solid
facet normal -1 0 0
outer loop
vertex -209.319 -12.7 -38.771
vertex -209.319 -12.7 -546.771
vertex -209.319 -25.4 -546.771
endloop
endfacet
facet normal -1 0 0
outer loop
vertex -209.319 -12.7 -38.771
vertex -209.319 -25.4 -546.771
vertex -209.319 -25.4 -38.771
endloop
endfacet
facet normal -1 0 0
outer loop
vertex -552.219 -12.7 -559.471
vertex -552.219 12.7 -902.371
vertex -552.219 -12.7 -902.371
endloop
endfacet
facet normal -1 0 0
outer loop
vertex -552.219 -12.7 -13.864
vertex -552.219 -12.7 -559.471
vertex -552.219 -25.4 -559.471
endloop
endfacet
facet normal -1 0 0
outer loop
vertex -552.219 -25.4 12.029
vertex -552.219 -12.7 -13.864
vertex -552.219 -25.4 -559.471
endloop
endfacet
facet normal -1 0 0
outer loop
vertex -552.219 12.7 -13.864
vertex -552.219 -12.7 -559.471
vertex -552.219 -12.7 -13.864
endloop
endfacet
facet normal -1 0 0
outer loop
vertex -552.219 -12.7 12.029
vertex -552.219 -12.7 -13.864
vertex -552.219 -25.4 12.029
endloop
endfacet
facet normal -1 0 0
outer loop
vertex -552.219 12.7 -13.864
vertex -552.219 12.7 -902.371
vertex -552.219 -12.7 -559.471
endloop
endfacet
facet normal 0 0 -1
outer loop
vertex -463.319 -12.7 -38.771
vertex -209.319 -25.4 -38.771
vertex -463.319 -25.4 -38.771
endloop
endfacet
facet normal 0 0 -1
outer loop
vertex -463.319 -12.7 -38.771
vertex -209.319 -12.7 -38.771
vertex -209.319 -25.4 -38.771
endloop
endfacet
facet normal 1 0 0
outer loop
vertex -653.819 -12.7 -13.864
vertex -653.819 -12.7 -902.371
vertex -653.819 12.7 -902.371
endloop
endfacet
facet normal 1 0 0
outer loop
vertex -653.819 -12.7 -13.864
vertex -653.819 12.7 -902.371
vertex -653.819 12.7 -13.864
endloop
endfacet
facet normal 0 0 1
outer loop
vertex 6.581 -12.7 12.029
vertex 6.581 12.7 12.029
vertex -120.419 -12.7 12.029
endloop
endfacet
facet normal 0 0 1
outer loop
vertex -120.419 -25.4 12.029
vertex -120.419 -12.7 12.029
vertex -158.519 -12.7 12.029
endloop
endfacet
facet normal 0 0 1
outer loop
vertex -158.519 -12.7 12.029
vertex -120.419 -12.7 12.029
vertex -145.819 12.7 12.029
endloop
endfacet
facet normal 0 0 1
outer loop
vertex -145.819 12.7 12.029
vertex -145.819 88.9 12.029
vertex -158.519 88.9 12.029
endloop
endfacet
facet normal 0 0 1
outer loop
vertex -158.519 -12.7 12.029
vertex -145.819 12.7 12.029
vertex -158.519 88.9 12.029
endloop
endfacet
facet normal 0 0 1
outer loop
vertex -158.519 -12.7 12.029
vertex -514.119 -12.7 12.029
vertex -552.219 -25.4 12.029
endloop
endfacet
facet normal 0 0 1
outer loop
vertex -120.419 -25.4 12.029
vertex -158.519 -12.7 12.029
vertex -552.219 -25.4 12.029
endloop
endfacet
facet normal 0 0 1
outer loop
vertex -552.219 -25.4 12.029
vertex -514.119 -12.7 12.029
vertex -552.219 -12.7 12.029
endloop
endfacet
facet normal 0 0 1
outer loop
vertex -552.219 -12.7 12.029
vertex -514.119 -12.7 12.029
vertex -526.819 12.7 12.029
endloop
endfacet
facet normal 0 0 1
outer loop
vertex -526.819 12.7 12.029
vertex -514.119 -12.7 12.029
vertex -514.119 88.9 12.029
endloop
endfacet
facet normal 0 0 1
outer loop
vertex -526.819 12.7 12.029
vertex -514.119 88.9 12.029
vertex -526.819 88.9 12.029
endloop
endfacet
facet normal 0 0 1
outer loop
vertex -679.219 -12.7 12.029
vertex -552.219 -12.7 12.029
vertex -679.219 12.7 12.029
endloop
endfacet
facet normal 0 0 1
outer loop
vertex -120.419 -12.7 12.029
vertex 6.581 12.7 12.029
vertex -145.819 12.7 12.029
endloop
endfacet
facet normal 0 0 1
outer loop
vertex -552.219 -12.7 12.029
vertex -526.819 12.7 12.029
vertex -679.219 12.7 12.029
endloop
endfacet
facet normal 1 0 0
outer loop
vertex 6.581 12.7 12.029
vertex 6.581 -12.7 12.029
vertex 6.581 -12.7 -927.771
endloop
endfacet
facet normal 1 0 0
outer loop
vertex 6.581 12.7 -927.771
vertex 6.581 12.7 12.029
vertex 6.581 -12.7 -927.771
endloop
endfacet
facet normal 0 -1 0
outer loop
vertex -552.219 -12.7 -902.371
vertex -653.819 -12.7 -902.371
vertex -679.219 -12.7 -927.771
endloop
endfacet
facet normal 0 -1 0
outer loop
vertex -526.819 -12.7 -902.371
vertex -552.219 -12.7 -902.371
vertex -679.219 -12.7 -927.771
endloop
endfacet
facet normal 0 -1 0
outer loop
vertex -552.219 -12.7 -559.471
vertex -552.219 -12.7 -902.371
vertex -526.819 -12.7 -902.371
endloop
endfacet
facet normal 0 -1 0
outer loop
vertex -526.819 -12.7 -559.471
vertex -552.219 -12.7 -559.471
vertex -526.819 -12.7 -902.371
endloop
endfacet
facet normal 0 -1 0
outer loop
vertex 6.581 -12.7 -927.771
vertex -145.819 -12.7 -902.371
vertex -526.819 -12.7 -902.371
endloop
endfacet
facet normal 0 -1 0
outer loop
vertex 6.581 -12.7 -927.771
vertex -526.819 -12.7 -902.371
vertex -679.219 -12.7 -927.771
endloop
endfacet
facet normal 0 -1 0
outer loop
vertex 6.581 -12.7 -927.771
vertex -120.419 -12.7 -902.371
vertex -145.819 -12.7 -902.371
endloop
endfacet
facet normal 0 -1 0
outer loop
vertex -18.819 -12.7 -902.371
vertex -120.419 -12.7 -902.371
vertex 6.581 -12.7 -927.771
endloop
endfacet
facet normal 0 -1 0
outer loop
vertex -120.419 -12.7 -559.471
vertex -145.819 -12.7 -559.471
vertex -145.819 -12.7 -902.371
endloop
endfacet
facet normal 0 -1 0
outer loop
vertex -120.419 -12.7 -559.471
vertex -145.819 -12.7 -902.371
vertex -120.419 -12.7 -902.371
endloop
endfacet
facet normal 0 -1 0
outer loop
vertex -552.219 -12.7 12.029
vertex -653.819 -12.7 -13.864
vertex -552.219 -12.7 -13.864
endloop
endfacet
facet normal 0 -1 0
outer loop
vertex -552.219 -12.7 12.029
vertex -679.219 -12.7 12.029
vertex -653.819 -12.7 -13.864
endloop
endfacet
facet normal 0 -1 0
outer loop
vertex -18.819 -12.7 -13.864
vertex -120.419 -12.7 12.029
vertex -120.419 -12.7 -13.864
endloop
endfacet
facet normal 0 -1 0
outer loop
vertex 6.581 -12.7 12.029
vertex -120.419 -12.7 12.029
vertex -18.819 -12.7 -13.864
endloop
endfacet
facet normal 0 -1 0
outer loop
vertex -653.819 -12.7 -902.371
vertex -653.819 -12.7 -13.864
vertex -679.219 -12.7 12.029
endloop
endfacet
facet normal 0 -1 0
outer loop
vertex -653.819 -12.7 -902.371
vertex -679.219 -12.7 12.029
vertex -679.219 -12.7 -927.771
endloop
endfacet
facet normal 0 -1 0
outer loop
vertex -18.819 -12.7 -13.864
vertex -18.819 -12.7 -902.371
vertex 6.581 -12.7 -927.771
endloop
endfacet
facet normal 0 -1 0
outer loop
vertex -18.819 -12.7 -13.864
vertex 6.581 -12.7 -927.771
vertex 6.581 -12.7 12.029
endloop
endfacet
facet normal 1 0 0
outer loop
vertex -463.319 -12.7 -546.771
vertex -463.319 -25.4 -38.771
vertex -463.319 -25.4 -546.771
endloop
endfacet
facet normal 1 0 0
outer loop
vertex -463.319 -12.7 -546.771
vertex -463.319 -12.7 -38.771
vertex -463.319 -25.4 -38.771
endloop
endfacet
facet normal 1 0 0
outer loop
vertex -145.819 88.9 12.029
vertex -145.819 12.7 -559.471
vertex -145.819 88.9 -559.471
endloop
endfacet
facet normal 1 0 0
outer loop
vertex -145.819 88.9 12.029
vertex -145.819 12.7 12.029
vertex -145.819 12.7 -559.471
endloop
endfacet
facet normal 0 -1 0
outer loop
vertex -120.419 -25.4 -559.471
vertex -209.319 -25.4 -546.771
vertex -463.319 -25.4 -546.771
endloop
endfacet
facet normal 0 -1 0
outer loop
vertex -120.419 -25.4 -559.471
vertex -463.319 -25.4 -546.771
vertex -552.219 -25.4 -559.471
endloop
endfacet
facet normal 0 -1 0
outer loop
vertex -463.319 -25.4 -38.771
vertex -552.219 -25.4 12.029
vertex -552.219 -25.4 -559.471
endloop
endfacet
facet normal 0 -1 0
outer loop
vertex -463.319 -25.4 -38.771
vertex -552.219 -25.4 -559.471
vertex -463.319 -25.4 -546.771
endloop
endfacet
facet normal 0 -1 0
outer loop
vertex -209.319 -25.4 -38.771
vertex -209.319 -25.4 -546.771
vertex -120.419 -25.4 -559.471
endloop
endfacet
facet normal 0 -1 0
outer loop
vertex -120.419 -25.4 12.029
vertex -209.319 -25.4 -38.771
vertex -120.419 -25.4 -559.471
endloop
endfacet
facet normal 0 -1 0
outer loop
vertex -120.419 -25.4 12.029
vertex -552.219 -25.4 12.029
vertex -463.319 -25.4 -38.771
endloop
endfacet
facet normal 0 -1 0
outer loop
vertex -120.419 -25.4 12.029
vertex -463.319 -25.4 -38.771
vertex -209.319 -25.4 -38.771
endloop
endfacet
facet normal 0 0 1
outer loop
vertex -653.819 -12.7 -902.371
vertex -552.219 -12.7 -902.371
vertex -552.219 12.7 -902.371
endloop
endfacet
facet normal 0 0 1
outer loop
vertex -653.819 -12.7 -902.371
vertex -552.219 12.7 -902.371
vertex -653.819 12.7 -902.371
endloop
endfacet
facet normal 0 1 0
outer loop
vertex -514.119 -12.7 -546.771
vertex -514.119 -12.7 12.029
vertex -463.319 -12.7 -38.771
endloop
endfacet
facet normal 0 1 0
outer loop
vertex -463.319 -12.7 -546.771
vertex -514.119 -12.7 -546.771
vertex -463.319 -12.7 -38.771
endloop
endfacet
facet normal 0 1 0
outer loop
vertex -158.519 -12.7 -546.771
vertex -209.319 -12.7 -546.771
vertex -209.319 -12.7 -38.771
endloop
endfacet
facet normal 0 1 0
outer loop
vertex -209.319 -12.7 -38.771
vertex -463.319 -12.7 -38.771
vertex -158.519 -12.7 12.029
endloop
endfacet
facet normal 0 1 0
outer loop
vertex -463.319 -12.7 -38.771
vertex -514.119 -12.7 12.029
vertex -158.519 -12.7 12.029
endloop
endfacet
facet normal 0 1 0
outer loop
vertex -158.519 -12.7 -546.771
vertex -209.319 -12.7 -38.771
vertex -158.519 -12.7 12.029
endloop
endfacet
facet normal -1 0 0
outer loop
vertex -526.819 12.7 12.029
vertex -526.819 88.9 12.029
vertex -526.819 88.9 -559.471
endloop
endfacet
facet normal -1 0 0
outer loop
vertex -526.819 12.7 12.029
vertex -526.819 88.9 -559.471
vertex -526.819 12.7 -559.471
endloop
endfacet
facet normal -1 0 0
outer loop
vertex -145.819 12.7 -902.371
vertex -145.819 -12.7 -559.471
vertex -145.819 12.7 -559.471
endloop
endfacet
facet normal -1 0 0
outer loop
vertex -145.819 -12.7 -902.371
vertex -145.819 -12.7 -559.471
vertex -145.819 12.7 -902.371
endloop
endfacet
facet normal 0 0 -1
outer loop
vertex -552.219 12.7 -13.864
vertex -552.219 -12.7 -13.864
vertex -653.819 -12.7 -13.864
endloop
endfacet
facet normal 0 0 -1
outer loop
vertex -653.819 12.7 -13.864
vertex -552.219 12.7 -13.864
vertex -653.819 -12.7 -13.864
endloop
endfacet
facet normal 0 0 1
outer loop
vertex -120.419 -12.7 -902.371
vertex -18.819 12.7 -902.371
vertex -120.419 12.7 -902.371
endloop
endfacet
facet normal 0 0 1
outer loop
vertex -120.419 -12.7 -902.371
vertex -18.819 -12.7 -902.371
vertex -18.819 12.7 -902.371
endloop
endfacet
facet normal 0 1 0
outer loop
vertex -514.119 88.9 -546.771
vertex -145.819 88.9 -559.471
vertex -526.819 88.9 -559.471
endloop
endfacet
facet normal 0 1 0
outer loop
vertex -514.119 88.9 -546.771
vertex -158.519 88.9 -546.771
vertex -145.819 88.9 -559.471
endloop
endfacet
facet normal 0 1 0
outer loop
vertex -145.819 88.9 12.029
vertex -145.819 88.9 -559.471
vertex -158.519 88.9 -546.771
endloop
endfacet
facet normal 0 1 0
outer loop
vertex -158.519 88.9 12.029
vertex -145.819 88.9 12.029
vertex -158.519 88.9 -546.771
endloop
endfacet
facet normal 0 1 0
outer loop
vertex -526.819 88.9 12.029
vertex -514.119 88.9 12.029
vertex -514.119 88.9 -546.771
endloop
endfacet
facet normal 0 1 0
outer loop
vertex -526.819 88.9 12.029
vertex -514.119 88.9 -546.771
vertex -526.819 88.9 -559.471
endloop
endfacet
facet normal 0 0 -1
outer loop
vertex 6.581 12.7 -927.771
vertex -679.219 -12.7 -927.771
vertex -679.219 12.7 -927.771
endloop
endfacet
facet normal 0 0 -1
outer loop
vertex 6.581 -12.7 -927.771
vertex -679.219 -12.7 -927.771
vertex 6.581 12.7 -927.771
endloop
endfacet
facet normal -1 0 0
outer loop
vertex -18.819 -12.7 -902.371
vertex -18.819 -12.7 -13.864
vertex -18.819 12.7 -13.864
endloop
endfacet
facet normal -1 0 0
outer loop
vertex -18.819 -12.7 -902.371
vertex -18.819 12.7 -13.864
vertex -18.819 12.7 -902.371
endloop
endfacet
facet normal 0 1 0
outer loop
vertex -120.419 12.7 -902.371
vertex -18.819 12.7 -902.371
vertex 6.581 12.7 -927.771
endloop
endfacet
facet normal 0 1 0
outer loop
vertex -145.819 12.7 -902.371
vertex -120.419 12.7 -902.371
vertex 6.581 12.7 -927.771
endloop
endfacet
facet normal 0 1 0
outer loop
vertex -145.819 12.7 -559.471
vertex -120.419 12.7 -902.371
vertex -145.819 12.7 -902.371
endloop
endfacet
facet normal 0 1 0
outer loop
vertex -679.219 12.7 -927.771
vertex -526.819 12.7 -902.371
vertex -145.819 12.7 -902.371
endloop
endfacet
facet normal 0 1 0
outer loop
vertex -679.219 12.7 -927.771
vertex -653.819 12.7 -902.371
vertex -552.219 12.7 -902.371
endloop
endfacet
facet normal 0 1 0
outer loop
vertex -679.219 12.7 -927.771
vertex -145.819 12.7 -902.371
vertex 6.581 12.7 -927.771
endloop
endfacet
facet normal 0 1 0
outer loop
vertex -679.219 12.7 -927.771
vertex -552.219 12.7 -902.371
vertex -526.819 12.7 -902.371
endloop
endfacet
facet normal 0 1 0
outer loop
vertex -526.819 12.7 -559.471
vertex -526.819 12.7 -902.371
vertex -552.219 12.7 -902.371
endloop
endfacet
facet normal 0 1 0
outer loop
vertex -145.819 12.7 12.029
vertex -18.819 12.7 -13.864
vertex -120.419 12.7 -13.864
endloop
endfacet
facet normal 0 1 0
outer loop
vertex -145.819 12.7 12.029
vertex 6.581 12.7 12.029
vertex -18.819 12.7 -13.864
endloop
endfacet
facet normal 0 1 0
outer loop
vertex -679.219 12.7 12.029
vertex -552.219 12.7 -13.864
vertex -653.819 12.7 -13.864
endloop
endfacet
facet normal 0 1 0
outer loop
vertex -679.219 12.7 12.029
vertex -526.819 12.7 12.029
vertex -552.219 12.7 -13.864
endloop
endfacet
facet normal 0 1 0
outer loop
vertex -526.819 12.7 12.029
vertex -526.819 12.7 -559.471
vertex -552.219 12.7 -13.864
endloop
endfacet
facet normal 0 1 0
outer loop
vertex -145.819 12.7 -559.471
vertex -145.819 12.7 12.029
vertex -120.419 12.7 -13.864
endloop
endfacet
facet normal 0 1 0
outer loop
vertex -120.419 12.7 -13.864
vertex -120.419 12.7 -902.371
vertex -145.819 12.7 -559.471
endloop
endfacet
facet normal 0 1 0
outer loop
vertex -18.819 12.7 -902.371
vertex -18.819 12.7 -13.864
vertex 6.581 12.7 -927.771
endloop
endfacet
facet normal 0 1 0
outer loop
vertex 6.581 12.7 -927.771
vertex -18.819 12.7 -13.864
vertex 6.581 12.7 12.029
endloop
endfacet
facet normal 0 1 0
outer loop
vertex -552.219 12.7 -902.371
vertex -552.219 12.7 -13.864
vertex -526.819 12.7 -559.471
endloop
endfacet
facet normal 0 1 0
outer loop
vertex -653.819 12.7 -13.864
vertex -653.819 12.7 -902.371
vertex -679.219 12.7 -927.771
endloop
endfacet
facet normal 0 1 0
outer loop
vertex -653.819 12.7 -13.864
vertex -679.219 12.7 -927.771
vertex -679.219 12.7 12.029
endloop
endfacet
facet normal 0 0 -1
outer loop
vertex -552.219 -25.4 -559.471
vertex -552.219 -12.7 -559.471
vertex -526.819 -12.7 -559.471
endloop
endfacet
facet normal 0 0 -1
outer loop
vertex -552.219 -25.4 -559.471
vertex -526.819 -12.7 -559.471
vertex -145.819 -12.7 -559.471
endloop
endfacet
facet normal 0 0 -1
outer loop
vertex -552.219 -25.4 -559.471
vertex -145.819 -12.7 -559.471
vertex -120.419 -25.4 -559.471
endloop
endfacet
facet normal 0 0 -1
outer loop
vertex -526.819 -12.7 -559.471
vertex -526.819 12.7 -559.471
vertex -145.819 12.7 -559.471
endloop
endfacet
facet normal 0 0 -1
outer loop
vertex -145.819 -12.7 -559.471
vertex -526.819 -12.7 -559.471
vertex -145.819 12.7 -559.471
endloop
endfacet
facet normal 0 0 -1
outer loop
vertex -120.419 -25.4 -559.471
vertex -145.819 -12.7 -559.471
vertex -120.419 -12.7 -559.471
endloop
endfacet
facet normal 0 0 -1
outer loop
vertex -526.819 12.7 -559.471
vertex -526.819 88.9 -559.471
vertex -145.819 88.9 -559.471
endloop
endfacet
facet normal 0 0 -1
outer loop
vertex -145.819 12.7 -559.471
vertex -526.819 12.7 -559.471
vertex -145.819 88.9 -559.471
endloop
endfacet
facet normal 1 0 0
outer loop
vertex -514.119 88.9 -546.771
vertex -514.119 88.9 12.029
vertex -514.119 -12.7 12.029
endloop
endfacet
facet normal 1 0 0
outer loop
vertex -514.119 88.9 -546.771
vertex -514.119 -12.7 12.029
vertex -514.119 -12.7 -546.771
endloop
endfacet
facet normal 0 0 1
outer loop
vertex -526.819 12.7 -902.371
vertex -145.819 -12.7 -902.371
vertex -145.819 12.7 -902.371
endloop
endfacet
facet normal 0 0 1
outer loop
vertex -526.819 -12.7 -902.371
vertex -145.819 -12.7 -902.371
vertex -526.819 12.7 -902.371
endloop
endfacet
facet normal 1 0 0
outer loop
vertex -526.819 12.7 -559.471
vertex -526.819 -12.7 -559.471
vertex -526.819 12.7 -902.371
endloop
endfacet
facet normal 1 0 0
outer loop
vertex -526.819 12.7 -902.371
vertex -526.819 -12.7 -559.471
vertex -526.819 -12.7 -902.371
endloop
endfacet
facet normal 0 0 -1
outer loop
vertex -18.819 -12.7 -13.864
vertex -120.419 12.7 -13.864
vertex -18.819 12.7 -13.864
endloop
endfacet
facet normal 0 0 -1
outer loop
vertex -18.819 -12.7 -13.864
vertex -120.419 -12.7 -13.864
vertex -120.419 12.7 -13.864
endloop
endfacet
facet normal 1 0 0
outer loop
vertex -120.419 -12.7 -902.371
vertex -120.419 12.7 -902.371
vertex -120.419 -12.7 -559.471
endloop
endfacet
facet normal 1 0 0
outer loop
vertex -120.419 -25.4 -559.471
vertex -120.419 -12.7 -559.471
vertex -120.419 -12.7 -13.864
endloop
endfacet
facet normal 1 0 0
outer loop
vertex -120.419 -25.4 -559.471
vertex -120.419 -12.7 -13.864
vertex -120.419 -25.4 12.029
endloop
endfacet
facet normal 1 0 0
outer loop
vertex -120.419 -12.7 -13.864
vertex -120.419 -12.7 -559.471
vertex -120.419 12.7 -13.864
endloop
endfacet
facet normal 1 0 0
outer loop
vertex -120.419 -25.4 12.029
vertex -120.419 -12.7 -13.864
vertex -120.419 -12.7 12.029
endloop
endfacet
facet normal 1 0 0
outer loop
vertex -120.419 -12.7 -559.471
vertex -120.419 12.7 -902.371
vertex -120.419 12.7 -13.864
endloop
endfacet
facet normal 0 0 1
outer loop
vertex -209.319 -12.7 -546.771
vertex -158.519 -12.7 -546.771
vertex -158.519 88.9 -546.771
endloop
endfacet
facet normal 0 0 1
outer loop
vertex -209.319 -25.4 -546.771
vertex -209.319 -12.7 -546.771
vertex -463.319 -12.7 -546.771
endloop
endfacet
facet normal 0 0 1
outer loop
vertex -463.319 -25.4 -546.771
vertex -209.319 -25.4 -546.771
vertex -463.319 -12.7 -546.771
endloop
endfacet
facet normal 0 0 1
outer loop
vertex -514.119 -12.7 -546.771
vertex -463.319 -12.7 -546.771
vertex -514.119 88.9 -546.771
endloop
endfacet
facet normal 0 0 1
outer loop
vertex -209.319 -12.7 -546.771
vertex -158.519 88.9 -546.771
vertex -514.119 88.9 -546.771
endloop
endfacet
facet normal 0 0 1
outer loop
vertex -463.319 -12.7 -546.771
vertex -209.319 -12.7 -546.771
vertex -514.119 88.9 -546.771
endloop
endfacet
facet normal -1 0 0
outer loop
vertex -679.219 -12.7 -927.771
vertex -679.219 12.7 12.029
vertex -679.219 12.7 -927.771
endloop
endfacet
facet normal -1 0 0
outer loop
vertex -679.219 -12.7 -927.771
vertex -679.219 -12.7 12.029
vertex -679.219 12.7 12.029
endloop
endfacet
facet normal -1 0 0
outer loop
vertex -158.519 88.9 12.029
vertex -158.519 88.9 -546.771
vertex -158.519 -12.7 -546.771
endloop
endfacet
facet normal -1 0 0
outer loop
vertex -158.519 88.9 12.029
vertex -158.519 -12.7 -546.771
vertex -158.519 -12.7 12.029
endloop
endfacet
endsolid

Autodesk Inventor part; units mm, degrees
ref_plane "YZ Plane" through (0, 0, 0) normal (1, 0, 0) x (0, 1, 0)
ref_plane "XZ Plane" through (0, 0, 0) normal (0, 1, 0) x (-1, 0, 0)
sketch "Sketch1" plane through (0, 0, 0) normal (0, 1, 0) x (-1, 0, 0)
  line L0 (-6.5808, 12.0286) -> (-6.5808, -927.7714)
  line L1 (-6.5808, 12.0286) -> (18.8192, 12.0286)
  line L2 (18.8192, 12.0286) -> (18.8192, -902.3714)
  line L3 (18.8192, -902.3714) -> (653.8192, -902.3714)
  line L4 (653.8192, -902.3714) -> (653.8192, 12.0286)
  line L5 (653.8192, 12.0286) -> (679.2192, 12.0286)
  line L6 (679.2192, 12.0286) -> (679.2192, -927.7714)
  line L7 (679.2192, -927.7714) -> (-6.5808, -927.7714)
  line L8 (18.8192, 12.0286) -> (145.8192, 12.0286)
  line L9 (145.8192, 12.0286) -> (145.8192, -902.3714)
  line L10 (145.8192, -902.3714) -> (120.4192, -902.3714)
  line L11 (120.4192, -902.3714) -> (120.4192, 12.0286)
  line L12 (120.4192, -13.8644) -> (18.8192, -13.8644)
  line L13 (653.8192, 12.0286) -> (526.8192, 12.0286)
  line L14 (526.8192, 12.0286) -> (526.8192, -902.3714)
  line L15 (552.2192, 12.0286) -> (552.2192, -902.3714)
  line L16 (552.2192, -13.8644) -> (653.8192, -13.8644)
  point P0 (69.6192, -13.8644)
  dimension "d0" = 939.8
  dimension "d1" = 25.4
  dimension "d2" = 914.4
  dimension "d3" = 635
  dimension "d5" = 25.4
  dimension "d6" = 90
  dimension "d9" = 127
  dimension "d11" = 25.4
  dimension "d12" = 127
  dimension "d21" = 25.4
extrude "Extrusion1" add sketch "Sketch1" along normal mid plane 25.4 contours L1 L2 L3 L4 L5 L6 L7 L0 | L8 L11 L12 L2 | L8 L9 L3 L11 | L4 L16 L15 L13 | L15 L3 L14 L13
sketch "Sketch2" plane through (-526.8192, -12.7, -902.3714) normal (1, 0, 0) x (0, 0, -1)
  line L0 (-914.4, 0) -> (-355.6, 0)
  line L1 (-355.6, 0) -> (-355.6, 101.6)
  line L2 (-355.6, 101.6) -> (-914.4, 101.6)
  line L3 (-914.4, 101.6) -> (-914.4, 0)
  dimension "d14" = 558.8
  dimension "d16" = 101.6
extrude "Extrusion2" add sketch "Sketch2" along normal blind 12.7
ref_plane "Work Plane1" through (-336.3192, 12.7, -902.3714) normal (1, 0, 0) x (0, -1, 0)
mirror "Mirror1" about plane through (-336.3192, 12.7, -902.3714) normal (1, 0, 0) of "Extrusion2"
sketch "Sketch3" plane through (-145.8192, 12.7, -546.7714) normal (0, 0, -1) x (-1, 0, 0)
  line L0 (0, 76.2) -> (381, 76.2)
  line L1 (381, 76.2) -> (381, -25.4)
  line L2 (381, -25.4) -> (0, -25.4)
  line L3 (0, -25.4) -> (0, 76.2)
extrude "Extrusion3" add sketch "Sketch3" along normal blind 12.7
sketch "Sketch4" plane through (0, -12.7, 0) normal (0, -1, 0) x (1, 0, 0)
  line L0 (6.5808, 12.0286) -> (-158.5192, 12.0286) projected
  line L1 (-552.2192, -902.3714) -> (-552.2192, -13.8644) projected
  line L2 (-552.2192, -559.4714) -> (-120.4192, -559.4714)
  line L3 (-120.4192, -559.4714) -> (-120.4192, 12.0286)
  line L4 (-120.4192, 12.0286) -> (-552.2192, 12.0286)
  line L5 (-552.2192, 12.0286) -> (-552.2192, -559.4714)
extrude "Extrusion4" add sketch "Sketch4" along normal blind 12.7
sketch "Sketch5" plane through (0, -12.7, 0) normal (0, 1, 0) x (1, 0, 0)
  line L0 (-514.1192, -12.0286) -> (-514.1192, 546.7714) projected
  line L1 (-158.5192, 546.7714) -> (-514.1192, 546.7714) projected
  line L2 (-463.3192, 546.7714) -> (-209.3192, 546.7714)
  line L3 (-209.3192, 546.7714) -> (-209.3192, 38.7714)
  line L4 (-209.3192, 38.7714) -> (-463.3192, 38.7714)
  line L5 (-463.3192, 38.7714) -> (-463.3192, 546.7714)
  point P0 (-336.3192, 38.7714)
  dimension "d24" = 254
  dimension "d25" = 508
  dimension "d26" = 177.8
extrude "Extrusion5" cut sketch "Sketch5" against normal blind 12.7
properties part number "Robot frame"
